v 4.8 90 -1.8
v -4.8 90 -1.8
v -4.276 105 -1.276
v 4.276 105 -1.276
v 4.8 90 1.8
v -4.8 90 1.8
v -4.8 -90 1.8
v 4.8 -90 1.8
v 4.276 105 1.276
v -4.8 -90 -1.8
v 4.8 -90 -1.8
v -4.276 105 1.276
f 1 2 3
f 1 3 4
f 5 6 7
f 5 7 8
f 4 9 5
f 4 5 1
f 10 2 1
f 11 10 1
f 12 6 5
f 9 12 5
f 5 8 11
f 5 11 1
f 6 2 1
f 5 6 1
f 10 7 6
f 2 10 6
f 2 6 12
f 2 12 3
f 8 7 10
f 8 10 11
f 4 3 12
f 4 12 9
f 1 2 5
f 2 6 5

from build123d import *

# Parameters (mm, degrees)
ESQUISSE1_W        = 9.6
ESQUISSE1_H        = 180
BOSS_EXTRU_1_DEPTH = 1.8
ESQUISSE4_W        = 9.6
ESQUISSE4_H        = 3.6
BOSS_EXTRU_4_DEPTH = 15
D_POUILLE5_ANGLE   = -2


with BuildPart() as part:
    # Esquisse1 → Boss.-Extru.1 (new, symmetric)
    with BuildSketch(Plane.XY):
        Rectangle(ESQUISSE1_W, ESQUISSE1_H)
    extrude(amount=BOSS_EXTRU_1_DEPTH, both=True)


with BuildPart() as body_2:
    # Esquisse4 → Boss.-Extru.4 (new body)
    with BuildSketch(Plane(origin=(0, 90, 0), x_dir=(1, 0, 0), z_dir=(0, 1, 0))):
        Rectangle(ESQUISSE4_W, ESQUISSE4_H)
    extrude(amount=BOSS_EXTRU_4_DEPTH)

    # Dépouille5
    d_pouille5_faces = [body_2.faces().sort_by_distance(p)[0] for p in [
        (4.8, 97.5, 0),
        (0, 97.5, 1.8),
        (-4.8, 97.5, 0),
        (0, 97.5, -1.8),
    ]]
    draft(d_pouille5_faces, Plane(origin=(0, 90, 0), x_dir=(0, 0, -1), z_dir=(0, -1, 0)), D_POUILLE5_ANGLE)


solid = Compound([part.part, body_2.part])
